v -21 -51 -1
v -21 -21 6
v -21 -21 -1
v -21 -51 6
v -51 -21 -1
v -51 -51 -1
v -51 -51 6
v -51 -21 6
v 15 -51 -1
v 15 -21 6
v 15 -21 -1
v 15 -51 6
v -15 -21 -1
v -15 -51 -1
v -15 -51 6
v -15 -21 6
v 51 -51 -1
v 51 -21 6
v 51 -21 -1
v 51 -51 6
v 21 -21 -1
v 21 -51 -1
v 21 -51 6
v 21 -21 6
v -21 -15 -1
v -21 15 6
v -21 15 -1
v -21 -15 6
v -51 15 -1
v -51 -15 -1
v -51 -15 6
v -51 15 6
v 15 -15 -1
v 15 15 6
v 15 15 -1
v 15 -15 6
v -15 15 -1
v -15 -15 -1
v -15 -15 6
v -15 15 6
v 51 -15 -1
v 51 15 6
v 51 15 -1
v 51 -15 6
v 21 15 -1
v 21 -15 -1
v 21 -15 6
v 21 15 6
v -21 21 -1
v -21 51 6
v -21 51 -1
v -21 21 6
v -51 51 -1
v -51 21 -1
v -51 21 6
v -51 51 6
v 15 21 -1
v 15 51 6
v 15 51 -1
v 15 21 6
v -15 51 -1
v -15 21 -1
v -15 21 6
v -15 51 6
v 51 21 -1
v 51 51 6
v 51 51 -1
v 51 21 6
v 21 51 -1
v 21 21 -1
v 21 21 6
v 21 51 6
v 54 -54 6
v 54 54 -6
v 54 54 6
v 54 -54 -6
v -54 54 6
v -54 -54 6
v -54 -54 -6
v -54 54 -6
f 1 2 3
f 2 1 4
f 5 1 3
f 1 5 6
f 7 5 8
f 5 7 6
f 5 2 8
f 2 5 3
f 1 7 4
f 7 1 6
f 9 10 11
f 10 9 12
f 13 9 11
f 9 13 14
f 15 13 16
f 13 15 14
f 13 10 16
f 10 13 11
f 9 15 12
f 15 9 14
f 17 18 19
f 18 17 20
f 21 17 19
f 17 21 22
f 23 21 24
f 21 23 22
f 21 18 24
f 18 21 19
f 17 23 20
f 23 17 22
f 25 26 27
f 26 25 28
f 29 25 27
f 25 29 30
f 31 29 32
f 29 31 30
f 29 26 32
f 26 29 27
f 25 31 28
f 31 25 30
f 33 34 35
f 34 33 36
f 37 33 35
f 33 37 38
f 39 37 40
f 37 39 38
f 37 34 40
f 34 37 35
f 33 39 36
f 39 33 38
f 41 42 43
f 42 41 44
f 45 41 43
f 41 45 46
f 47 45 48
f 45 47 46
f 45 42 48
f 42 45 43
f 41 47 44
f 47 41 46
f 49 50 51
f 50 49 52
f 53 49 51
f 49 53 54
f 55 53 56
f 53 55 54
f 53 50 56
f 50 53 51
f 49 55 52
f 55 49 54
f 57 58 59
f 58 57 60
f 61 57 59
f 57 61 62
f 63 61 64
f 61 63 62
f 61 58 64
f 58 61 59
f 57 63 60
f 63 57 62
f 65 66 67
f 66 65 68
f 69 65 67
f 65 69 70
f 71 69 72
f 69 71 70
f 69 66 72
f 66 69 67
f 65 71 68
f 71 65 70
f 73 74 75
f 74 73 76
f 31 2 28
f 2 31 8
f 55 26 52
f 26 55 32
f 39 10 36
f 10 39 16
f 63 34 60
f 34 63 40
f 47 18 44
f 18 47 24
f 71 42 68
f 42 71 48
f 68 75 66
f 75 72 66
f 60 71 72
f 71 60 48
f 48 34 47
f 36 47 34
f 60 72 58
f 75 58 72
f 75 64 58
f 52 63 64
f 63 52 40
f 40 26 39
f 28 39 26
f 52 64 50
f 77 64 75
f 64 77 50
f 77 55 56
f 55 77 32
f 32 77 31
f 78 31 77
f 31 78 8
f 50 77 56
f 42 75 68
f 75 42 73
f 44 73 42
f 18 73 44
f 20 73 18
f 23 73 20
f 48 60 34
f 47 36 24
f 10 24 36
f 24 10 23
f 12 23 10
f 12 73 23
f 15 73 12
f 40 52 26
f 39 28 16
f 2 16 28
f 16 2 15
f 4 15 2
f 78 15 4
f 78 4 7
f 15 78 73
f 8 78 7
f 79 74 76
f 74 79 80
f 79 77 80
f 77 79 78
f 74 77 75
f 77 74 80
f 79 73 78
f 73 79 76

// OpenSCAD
$fn = 32;

// ----------------------------------------------------------------------
// Pocket plate 108 x 108 x 12
// 3 x 3 pockets 30 mm square, 7 mm deep
// ----------------------------------------------------------------------

// --- parameters (mm) ---
thickness = 12;  // plate thickness
floor_t = 5;     // material left under each pocket
pocket = 30;     // pocket side length
pitch_x = 36;    // pocket pitch along X
pitch_y = 36;    // pocket pitch along Y
cols = 3;        // pockets per row
rows = 3;        // rows of pockets

// --- derived feature positions (mm) ---
depth = thickness - floor_t;        // = 7   pocket depth, down to the floor
span_x = (cols - 1) * pitch_x;      // = 72   distance between outer pockets
span_y = (rows - 1) * pitch_y;      // = 72   distance between outer pocket rows
origin_x = -span_x / 2;             // = -36   X of the first pocket
origin_y = -span_y / 2;             // = -36   Y of the first pocket
plate = [span_x + pocket + 6, span_y + pocket + 6, thickness];  // = [108, 108, 12]   overall size: pockets plus 3 mm of wall on each side
feature_centers = [
  [origin_x + 0 * pitch_x, origin_y + 0 * pitch_y],
  [origin_x + 1 * pitch_x, origin_y + 0 * pitch_y],
  [origin_x + 2 * pitch_x, origin_y + 0 * pitch_y],
  [origin_x + 0 * pitch_x, origin_y + 1 * pitch_y],
  [origin_x + 1 * pitch_x, origin_y + 1 * pitch_y],
  [origin_x + 2 * pitch_x, origin_y + 1 * pitch_y],
  [origin_x + 0 * pitch_x, origin_y + 2 * pitch_y],
  [origin_x + 1 * pitch_x, origin_y + 2 * pitch_y],
  [origin_x + 2 * pitch_x, origin_y + 2 * pitch_y]
];   // pocket centres, used verbatim by the cutter loop

// plate outline, then one pocket per centre in feature_centers
difference() {
  cube(plate, center = true);
  for (centre = feature_centers)
    translate([centre[0] - pocket / 2, centre[1] - pocket / 2, plate[2] / 2 - depth])
      cube([pocket, pocket, depth + 1]);  // centred on the declared pocket centre
}
